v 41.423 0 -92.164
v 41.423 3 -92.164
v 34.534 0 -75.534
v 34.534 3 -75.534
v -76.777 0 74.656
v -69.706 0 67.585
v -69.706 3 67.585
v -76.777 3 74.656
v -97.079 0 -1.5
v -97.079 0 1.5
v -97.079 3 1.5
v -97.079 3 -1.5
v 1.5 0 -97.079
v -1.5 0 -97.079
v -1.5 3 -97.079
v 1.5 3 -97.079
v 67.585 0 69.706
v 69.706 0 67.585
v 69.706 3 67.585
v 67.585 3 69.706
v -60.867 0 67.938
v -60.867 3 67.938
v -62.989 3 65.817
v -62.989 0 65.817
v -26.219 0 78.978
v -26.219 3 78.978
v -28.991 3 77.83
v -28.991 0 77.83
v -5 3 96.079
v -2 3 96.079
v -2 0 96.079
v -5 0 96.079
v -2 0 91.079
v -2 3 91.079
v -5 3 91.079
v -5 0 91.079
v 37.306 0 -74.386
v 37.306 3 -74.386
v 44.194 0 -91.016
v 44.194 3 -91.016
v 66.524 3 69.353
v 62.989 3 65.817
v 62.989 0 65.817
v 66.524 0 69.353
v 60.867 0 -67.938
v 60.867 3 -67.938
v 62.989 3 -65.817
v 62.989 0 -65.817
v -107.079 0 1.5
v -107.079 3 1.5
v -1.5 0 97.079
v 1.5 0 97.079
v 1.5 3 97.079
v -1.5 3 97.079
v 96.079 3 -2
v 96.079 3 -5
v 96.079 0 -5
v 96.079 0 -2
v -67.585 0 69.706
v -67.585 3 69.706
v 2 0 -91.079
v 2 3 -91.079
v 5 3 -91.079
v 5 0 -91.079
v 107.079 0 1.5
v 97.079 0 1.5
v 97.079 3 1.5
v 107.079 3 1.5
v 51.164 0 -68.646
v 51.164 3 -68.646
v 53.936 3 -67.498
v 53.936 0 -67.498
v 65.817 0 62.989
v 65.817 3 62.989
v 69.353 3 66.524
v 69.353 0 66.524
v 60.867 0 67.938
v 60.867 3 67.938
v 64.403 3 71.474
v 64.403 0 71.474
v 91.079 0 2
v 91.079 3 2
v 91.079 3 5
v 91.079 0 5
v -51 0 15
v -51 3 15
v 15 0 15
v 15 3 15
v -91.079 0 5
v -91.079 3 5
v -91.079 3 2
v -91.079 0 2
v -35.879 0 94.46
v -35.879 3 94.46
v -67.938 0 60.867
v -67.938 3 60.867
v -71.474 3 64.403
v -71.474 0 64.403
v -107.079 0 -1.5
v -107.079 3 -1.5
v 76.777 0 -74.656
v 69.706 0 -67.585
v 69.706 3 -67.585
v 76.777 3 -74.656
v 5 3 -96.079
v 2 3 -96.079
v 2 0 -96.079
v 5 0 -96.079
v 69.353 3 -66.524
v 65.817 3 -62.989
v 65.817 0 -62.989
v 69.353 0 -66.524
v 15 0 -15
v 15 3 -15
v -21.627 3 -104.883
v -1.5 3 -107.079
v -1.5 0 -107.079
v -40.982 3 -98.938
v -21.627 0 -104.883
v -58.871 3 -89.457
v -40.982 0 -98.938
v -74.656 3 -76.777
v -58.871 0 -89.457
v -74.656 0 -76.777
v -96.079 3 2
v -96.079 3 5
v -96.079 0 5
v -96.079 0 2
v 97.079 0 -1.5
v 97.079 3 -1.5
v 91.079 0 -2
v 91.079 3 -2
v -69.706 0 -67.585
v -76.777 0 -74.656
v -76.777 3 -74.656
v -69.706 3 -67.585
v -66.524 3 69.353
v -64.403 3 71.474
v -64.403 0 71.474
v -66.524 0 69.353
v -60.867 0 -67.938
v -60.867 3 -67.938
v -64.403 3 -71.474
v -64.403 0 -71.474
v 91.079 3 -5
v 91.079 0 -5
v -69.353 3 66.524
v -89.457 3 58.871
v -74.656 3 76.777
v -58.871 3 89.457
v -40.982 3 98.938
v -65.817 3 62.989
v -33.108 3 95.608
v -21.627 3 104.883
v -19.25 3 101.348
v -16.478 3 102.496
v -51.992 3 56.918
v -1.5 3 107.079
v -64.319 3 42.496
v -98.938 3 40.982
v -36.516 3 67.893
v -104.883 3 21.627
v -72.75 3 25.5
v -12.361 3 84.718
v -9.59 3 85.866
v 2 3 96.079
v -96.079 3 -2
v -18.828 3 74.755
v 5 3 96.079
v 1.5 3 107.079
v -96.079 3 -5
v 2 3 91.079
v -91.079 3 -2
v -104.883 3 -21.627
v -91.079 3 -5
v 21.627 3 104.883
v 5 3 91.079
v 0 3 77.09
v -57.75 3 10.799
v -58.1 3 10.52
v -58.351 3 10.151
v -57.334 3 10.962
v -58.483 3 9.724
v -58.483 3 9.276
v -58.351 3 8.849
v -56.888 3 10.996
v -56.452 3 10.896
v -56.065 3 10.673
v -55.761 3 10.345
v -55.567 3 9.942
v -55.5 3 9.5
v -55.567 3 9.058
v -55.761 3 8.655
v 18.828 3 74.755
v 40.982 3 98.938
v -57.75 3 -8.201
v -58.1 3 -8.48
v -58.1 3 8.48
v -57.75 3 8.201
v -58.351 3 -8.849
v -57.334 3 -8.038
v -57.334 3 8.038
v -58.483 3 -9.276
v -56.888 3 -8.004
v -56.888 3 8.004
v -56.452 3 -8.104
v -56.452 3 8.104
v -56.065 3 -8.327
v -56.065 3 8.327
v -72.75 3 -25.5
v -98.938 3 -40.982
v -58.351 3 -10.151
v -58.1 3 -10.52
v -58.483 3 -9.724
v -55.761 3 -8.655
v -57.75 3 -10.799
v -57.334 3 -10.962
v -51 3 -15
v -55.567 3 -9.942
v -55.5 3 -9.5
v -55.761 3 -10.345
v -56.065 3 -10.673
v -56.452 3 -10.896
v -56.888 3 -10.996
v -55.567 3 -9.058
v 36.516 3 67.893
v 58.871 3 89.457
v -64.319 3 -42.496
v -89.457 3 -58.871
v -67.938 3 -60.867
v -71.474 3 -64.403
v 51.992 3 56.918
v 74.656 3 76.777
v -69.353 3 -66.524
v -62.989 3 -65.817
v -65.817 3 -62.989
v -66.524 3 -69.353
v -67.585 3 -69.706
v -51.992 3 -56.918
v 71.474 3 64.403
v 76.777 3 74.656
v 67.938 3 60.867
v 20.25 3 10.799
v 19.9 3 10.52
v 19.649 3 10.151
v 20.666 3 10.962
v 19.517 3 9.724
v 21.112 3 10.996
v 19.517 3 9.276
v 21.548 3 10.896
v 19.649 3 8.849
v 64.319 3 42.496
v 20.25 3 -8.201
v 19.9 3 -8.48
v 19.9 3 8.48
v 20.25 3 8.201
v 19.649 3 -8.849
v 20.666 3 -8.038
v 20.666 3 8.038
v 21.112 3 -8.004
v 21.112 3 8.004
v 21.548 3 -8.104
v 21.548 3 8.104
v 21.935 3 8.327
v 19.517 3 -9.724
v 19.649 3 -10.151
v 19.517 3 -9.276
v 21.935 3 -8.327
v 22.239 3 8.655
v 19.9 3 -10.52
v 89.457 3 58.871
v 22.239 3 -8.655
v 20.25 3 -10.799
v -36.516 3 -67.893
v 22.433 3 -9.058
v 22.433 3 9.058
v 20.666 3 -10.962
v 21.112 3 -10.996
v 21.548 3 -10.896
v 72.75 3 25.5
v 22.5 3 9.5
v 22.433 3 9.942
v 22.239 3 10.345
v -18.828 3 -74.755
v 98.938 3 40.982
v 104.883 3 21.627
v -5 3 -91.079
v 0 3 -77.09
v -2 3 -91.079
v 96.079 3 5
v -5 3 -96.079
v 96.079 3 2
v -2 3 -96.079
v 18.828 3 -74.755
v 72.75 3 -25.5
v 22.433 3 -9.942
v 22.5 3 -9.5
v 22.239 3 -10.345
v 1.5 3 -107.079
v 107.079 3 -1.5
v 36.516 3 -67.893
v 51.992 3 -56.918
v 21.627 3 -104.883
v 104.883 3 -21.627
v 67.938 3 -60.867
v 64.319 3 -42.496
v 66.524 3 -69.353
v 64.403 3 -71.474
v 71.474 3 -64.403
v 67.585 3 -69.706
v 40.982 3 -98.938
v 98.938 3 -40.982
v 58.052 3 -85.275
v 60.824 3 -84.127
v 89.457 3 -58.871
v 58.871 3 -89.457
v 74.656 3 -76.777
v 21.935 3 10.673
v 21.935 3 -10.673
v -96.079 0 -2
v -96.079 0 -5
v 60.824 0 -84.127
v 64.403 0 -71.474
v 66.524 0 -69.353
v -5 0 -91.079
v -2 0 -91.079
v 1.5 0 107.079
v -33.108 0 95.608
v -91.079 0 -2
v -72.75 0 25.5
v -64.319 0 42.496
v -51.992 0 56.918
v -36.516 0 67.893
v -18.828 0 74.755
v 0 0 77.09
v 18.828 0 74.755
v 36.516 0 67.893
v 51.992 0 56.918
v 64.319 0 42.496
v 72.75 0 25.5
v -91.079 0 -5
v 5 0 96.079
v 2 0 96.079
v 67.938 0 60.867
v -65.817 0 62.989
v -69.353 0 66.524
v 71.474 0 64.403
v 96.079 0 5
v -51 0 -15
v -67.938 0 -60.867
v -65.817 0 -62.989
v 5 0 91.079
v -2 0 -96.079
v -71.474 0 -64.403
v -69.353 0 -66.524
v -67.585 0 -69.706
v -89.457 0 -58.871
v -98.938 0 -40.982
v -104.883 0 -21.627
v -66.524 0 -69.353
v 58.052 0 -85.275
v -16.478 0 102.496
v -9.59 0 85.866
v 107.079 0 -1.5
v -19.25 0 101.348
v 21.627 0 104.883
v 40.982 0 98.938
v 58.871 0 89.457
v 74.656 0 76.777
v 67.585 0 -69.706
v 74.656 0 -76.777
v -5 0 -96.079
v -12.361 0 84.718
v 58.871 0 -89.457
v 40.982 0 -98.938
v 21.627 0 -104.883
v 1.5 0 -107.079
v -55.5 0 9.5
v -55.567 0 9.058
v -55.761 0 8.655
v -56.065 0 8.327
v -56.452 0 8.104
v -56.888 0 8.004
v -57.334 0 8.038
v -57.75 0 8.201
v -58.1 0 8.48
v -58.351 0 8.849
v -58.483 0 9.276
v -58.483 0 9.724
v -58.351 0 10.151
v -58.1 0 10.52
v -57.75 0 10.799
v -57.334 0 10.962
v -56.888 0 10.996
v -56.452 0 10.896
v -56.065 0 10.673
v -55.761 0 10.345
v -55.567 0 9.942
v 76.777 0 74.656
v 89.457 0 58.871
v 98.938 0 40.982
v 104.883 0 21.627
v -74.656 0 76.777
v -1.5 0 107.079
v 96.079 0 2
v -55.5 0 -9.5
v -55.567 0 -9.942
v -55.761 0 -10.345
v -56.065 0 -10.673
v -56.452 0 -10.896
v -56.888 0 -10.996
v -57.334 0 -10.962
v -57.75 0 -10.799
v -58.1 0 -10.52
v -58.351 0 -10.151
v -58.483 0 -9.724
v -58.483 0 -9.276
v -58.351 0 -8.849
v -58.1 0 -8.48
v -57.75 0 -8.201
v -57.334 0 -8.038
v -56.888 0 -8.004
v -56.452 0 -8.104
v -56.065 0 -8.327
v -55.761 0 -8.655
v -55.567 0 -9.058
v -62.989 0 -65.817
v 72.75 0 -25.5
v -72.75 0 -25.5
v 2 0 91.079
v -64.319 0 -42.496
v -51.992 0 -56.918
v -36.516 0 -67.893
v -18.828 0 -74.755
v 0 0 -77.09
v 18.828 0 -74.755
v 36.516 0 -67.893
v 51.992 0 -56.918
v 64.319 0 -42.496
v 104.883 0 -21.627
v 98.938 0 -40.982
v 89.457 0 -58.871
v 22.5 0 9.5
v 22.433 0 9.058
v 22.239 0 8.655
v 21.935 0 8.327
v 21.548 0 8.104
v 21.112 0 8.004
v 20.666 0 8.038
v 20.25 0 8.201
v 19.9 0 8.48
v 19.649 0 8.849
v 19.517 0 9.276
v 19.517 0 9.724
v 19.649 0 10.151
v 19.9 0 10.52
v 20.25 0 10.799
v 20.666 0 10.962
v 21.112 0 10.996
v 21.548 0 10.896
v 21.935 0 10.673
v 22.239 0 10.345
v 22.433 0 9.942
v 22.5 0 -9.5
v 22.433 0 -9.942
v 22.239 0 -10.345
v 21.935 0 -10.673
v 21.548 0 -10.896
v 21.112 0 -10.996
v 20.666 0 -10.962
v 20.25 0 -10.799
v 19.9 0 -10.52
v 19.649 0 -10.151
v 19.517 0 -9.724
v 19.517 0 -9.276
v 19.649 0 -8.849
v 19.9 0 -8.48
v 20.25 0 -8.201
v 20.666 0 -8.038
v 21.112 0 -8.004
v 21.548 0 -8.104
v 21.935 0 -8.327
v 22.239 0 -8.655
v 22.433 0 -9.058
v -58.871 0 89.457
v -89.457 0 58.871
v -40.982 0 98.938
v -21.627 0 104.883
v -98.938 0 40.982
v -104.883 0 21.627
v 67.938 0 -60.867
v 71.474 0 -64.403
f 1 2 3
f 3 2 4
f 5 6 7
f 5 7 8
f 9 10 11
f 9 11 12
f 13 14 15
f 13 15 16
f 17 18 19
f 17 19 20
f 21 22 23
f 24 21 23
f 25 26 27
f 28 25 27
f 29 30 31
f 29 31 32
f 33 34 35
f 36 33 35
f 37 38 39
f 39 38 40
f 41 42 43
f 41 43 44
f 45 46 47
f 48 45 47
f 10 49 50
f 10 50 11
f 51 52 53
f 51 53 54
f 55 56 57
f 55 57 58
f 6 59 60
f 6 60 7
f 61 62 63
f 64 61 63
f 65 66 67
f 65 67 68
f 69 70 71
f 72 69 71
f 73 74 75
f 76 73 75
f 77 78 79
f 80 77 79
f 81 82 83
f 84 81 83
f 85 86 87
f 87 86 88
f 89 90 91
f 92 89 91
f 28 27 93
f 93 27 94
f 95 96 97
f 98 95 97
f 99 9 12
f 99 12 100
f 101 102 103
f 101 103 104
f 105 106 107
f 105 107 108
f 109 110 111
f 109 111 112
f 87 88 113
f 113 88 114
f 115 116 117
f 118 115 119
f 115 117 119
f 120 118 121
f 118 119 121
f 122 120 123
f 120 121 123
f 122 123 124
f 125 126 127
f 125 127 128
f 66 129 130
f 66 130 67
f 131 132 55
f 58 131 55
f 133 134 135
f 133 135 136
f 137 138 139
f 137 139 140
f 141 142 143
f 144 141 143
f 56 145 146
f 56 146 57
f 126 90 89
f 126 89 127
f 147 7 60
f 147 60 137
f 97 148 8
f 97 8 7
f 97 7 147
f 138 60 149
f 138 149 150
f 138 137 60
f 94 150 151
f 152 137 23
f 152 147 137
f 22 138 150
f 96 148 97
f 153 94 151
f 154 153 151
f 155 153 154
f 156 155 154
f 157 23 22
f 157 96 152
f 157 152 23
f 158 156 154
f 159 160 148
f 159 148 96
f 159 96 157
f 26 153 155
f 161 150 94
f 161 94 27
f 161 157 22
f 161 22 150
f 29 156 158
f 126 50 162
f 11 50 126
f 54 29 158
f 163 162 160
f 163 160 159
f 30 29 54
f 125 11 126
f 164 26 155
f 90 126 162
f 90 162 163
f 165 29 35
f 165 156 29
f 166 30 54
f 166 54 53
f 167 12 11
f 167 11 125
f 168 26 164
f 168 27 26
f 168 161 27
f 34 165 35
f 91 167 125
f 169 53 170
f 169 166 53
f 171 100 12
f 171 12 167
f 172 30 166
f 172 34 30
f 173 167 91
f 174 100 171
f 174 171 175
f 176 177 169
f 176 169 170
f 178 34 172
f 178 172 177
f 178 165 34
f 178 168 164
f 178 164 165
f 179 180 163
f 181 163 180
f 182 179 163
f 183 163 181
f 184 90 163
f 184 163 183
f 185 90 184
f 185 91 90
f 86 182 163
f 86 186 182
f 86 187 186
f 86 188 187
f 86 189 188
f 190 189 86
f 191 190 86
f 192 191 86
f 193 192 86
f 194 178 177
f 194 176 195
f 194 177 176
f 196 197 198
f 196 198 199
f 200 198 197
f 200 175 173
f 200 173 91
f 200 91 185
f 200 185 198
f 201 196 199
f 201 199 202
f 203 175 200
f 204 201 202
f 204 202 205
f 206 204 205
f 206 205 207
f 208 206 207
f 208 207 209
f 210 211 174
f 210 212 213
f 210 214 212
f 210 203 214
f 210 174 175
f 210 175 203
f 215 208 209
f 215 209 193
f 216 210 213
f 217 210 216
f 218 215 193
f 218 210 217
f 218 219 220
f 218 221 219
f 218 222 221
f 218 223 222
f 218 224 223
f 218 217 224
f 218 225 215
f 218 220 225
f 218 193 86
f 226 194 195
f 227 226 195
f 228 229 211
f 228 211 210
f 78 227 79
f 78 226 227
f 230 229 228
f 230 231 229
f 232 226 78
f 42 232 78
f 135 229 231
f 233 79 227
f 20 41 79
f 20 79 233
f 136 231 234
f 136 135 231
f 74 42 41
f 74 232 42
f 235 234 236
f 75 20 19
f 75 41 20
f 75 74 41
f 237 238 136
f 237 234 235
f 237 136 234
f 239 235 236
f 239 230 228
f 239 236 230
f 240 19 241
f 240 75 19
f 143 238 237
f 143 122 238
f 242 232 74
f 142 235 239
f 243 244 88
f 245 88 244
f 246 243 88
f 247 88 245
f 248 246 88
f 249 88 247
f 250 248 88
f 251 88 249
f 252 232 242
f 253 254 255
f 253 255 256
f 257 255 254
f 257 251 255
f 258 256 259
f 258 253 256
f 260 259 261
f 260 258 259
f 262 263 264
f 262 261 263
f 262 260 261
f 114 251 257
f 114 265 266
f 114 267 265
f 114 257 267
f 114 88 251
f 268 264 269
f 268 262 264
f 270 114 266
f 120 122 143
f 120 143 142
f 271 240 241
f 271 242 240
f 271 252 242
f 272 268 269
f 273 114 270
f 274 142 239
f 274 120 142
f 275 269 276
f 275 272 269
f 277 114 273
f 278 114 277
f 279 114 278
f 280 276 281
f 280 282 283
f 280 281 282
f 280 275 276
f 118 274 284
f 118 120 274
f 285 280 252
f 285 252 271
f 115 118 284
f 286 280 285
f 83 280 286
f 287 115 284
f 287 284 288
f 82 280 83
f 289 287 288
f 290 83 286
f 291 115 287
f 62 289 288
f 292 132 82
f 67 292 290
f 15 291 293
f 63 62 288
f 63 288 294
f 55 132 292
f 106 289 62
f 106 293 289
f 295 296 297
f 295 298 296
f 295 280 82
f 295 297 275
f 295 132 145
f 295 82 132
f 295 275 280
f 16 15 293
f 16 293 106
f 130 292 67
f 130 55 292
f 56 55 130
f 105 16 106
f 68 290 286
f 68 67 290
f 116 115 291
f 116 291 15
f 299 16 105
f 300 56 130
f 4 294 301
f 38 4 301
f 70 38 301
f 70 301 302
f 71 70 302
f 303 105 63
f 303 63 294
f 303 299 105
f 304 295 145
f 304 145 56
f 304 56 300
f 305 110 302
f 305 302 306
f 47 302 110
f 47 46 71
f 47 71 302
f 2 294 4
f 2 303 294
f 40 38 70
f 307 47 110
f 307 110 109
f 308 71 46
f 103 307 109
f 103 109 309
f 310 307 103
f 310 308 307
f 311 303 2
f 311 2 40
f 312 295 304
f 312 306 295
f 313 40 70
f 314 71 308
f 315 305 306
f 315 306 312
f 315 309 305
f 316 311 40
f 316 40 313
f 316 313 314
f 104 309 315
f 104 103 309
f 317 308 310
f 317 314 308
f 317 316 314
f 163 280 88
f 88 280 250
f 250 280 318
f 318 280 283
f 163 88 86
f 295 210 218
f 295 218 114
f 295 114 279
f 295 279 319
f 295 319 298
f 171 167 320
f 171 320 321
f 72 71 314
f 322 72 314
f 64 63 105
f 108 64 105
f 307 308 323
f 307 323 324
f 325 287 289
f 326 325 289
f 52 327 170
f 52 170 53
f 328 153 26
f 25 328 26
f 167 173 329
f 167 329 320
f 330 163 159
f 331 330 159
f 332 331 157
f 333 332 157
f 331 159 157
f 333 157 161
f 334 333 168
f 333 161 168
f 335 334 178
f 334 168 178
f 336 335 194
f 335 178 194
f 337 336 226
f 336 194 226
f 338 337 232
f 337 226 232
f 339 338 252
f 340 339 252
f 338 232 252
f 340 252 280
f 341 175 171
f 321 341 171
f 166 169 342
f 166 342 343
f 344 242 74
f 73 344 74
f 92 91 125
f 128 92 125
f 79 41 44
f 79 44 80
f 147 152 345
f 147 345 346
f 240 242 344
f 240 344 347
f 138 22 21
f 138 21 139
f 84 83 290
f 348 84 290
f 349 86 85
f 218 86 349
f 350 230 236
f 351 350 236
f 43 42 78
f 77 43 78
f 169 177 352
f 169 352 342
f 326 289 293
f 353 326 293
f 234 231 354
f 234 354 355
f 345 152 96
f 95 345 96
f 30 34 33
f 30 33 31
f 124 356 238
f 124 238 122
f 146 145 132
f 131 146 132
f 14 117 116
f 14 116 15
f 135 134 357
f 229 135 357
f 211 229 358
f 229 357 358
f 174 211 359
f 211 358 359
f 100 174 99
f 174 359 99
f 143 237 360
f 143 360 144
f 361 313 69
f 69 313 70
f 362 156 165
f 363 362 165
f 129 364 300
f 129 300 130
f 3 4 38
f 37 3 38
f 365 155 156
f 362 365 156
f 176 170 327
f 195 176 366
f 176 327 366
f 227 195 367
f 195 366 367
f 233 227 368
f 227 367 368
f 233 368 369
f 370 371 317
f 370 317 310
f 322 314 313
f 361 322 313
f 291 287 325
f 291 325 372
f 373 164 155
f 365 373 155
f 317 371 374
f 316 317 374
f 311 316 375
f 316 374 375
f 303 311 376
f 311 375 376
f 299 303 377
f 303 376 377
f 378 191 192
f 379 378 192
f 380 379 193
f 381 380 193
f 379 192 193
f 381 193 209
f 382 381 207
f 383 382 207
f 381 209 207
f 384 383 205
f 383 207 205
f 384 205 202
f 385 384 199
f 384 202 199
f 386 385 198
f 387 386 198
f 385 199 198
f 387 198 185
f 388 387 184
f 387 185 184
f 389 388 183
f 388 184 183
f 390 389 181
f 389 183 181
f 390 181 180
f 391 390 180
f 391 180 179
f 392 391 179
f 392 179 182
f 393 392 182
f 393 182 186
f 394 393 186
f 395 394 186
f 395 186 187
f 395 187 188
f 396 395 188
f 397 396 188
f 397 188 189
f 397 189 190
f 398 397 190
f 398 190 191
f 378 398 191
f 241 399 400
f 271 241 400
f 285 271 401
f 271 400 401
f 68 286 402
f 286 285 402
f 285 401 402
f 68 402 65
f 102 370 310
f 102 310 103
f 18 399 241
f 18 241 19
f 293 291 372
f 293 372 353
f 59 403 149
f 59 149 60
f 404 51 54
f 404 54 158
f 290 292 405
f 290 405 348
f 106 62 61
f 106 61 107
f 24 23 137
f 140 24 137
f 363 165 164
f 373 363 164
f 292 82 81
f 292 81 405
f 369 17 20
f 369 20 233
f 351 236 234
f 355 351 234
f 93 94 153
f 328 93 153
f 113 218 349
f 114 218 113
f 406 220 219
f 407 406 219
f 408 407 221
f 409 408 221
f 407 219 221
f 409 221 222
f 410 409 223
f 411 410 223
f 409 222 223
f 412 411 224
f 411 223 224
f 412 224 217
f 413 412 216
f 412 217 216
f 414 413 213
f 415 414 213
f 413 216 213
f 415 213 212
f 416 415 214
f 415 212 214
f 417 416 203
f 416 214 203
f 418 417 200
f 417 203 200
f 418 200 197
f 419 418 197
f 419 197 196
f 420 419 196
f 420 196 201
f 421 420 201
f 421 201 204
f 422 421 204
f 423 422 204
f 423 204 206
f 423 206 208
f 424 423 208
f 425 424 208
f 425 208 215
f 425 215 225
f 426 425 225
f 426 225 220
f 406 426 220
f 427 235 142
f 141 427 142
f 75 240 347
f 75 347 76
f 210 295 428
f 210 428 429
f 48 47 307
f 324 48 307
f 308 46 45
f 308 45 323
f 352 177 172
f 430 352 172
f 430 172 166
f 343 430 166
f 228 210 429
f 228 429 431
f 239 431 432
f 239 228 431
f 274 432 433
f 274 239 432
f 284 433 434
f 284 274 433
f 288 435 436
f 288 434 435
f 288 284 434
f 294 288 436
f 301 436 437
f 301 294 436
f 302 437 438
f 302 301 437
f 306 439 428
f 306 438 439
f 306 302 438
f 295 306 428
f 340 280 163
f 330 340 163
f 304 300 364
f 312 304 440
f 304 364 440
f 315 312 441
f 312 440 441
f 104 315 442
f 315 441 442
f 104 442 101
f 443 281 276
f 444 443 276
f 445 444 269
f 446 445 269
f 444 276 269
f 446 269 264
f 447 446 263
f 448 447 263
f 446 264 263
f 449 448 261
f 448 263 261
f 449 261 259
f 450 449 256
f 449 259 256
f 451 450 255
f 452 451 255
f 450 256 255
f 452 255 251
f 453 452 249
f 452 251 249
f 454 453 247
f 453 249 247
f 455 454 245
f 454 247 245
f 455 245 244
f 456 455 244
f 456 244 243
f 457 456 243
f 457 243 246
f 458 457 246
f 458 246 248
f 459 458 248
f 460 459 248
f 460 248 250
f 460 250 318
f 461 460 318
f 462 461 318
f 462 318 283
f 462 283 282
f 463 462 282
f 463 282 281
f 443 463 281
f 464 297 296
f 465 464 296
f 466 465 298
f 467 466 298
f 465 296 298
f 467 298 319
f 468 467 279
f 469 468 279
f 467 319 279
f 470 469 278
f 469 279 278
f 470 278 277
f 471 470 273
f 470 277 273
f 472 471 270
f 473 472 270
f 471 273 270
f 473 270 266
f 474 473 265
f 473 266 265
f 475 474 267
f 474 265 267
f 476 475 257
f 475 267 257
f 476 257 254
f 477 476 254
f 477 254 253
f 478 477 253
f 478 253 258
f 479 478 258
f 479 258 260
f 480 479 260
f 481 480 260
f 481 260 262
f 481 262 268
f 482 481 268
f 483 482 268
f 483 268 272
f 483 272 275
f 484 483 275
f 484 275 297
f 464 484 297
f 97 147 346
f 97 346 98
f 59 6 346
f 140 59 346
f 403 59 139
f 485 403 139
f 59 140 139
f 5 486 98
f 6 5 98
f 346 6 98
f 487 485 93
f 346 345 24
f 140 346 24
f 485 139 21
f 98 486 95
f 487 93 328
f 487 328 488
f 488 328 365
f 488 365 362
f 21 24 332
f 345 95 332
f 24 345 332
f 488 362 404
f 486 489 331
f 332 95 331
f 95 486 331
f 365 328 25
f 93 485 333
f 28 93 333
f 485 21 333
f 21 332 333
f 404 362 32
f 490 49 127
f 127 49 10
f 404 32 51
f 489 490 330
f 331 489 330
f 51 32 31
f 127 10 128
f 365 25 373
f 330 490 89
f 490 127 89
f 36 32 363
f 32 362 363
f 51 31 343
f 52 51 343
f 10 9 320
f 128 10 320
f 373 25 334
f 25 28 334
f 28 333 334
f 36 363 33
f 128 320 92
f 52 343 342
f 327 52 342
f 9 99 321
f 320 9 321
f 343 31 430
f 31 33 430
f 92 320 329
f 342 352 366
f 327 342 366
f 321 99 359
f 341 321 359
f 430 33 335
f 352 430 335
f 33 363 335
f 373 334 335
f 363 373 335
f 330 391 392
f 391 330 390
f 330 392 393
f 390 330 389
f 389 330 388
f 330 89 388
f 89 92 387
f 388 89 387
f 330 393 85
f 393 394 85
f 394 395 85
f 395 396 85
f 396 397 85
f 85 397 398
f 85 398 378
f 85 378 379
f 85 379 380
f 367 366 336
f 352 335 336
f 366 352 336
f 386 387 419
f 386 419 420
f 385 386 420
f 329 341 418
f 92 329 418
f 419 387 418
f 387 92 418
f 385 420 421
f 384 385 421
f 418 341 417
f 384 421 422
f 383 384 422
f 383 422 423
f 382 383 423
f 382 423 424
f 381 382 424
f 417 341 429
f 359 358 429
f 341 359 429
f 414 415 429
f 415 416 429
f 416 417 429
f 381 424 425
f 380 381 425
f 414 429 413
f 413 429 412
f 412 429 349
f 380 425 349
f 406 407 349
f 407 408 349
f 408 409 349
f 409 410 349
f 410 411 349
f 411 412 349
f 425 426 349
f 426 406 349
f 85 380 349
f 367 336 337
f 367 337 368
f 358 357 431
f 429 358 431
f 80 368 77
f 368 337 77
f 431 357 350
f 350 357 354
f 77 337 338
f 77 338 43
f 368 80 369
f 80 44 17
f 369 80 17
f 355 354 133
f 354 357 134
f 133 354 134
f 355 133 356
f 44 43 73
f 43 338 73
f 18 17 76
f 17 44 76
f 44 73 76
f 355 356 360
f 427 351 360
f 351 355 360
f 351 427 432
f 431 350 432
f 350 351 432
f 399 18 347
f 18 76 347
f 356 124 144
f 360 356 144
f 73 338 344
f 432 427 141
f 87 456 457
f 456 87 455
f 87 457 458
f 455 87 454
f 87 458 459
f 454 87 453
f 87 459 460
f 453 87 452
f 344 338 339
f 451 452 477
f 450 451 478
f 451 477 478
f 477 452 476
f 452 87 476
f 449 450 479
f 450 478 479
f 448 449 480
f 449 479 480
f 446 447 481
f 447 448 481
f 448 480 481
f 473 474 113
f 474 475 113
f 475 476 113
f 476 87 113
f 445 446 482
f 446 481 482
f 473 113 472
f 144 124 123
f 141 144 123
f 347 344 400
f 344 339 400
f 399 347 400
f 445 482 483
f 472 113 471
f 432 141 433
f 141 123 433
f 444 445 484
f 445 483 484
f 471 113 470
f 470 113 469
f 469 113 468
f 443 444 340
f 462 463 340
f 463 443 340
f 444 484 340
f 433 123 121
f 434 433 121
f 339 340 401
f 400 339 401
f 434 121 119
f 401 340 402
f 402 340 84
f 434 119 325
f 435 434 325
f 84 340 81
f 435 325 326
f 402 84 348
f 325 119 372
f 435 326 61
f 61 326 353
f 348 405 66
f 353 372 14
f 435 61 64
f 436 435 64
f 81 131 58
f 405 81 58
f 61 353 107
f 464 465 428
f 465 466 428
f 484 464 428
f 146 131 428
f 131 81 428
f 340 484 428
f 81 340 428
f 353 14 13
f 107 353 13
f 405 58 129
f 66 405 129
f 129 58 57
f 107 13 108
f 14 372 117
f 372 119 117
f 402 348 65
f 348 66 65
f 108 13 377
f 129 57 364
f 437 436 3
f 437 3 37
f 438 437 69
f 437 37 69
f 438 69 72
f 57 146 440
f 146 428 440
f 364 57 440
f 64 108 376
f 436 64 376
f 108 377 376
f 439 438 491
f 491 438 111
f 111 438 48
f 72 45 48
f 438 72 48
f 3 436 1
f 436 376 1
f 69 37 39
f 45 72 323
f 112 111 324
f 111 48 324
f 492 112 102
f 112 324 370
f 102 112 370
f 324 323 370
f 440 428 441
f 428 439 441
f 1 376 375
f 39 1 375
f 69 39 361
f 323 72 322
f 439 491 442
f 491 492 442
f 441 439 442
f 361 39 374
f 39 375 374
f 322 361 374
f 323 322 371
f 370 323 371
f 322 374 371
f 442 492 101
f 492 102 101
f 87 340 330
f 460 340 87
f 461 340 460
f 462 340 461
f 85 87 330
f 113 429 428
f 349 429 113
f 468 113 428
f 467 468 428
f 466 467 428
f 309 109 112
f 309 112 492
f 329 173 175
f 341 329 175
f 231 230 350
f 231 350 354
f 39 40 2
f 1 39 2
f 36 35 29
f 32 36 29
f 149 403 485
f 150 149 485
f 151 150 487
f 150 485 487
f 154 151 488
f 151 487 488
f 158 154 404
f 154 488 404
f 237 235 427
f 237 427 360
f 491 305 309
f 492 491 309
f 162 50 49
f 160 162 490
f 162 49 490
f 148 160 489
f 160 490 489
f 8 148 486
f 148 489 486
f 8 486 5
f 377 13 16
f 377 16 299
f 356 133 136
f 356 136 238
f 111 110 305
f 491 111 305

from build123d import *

# Parameters (mm, degrees)
SKETCH1_R           = 107.09
BOSS_EXTRUDE1_DEPTH = 3
CUT_EXTRUDE1_START  = -3
CUT_EXTRUDE1_DEPTH  = 4
CIRPATTERN1_COUNT   = 8
SKETCH7_W           = 3
SKETCH7_H           = 5
CUT_EXTRUDE4_DEPTH  = 3
CIRPATTERN2_COUNT   = 8
SKETCH4_R           = 1.5
SKETCH4_W           = 66
SKETCH4_H           = 30
CUT_EXTRUDE5_DEPTH  = 10
CUT_EXTRUDE6_DEPTH  = 3


with BuildPart() as part:
    # Sketch1 → Boss-Extrude1 (new body)
    with BuildSketch(Plane(origin=(0, 0, 0), x_dir=(1, 0, 0), z_dir=(0, 1, 0))):
        Circle(SKETCH1_R)
    extrude(amount=BOSS_EXTRUDE1_DEPTH)

    # Sketch2 → Cut-Extrude1 (cut)
    with BuildSketch(Plane(origin=(0, 3, 0), x_dir=(1, 0, 0), z_dir=(0, 1, 0)).offset(CUT_EXTRUDE1_START)):
        Polygon((-1.5, 597.330930071), (-1.5, 107.079494302), (-1.5, 97.079494302), (1.5, 97.079494302), (1.5, 107.079494302), (1.5, 597.330930071), (1.5, 1577.83380161), (-1.5, 1577.83380161), align=None)
    cut_extrude1 = extrude(amount=CUT_EXTRUDE1_DEPTH, mode=Mode.SUBTRACT)

    # CirPattern1: Cut-Extrude1 ×8 about axis
    cirpattern1_axis = Axis((0, 0, 0), (0, -1, 0))
    for i in range(1, CIRPATTERN1_COUNT):
        add(cut_extrude1.rotate(cirpattern1_axis, i * 360 / CIRPATTERN1_COUNT), mode=Mode.SUBTRACT)

    # Sketch7 → Cut-Extrude4 (cut)
    with BuildSketch(Plane(origin=(0, 3, 0), x_dir=(1, 0, 0), z_dir=(0, 1, 0))):
        with Locations((-3.5, 93.579494302)):
            Rectangle(SKETCH7_W, SKETCH7_H)
        with Locations((3.5, 93.579494302)):
            Rectangle(SKETCH7_W, SKETCH7_H)
    cut_extrude4 = extrude(amount=-CUT_EXTRUDE4_DEPTH, mode=Mode.SUBTRACT)

    # CirPattern2: Cut-Extrude4 ×8 about axis
    cirpattern2_axis = Axis((0, 0, 0), (0, 1, 0))
    for i in range(1, CIRPATTERN2_COUNT):
        add(cut_extrude4.rotate(cirpattern2_axis, i * 360 / CIRPATTERN2_COUNT), mode=Mode.SUBTRACT)

    # Sketch4 → Cut-Extrude5 (cut)
    with BuildSketch(Plane(origin=(0, 3, 0), x_dir=(1, 0, 0), z_dir=(0, 1, 0))):
        with Locations((-57, 9.5)):
            Circle(SKETCH4_R)
        with Locations((-57, -9.5)):
            Circle(SKETCH4_R)
        with Locations((21, -9.5)):
            Circle(SKETCH4_R)
        with Locations((21, 9.5)):
            Circle(SKETCH4_R)
        with Locations((-18, 0)):
            Rectangle(SKETCH4_W, SKETCH4_H)
        with BuildLine():
            Line((72.75038213, -25.5), (-72.75038213, -25.5))
            ThreePointArc((-72.75038213, -25.5), (0, -77.09), (72.75038213, -25.5))
        make_face()
        with BuildLine():
            Line((72.75038213, 25.5), (-72.75038213, 25.5))
            ThreePointArc((-72.75038213, 25.5), (0, 77.09), (72.75038213, 25.5))
        make_face()
    extrude(amount=-CUT_EXTRUDE5_DEPTH, mode=Mode.SUBTRACT)

    # Sketch9 → Cut-Extrude6 (cut)
    with BuildSketch(Plane(origin=(0, 3, 0), x_dir=(1, 0, 0), z_dir=(0, 1, 0))):
        Polygon((-35.879388071, -94.459883081), (-33.107749474, -95.607933378), (-26.219447691, -78.978101793), (-28.991086289, -77.830051496), align=None)
        Polygon((-19.249556486, -101.348184863), (-16.477917889, -102.49623516), (-9.589616106, -85.866403575), (-12.361254704, -84.718353278), align=None)
        Polygon((53.935833667, 67.497598822), (60.824135449, 84.127430407), (58.052496852, 85.275480704), (51.164195069, 68.645649119), align=None)
        Polygon((37.306002081, 74.385900604), (44.194303864, 91.015732189), (41.422665266, 92.163782487), (34.534363484, 75.533950901), align=None)
    extrude(amount=-CUT_EXTRUDE6_DEPTH, mode=Mode.SUBTRACT)


solid = part.part
